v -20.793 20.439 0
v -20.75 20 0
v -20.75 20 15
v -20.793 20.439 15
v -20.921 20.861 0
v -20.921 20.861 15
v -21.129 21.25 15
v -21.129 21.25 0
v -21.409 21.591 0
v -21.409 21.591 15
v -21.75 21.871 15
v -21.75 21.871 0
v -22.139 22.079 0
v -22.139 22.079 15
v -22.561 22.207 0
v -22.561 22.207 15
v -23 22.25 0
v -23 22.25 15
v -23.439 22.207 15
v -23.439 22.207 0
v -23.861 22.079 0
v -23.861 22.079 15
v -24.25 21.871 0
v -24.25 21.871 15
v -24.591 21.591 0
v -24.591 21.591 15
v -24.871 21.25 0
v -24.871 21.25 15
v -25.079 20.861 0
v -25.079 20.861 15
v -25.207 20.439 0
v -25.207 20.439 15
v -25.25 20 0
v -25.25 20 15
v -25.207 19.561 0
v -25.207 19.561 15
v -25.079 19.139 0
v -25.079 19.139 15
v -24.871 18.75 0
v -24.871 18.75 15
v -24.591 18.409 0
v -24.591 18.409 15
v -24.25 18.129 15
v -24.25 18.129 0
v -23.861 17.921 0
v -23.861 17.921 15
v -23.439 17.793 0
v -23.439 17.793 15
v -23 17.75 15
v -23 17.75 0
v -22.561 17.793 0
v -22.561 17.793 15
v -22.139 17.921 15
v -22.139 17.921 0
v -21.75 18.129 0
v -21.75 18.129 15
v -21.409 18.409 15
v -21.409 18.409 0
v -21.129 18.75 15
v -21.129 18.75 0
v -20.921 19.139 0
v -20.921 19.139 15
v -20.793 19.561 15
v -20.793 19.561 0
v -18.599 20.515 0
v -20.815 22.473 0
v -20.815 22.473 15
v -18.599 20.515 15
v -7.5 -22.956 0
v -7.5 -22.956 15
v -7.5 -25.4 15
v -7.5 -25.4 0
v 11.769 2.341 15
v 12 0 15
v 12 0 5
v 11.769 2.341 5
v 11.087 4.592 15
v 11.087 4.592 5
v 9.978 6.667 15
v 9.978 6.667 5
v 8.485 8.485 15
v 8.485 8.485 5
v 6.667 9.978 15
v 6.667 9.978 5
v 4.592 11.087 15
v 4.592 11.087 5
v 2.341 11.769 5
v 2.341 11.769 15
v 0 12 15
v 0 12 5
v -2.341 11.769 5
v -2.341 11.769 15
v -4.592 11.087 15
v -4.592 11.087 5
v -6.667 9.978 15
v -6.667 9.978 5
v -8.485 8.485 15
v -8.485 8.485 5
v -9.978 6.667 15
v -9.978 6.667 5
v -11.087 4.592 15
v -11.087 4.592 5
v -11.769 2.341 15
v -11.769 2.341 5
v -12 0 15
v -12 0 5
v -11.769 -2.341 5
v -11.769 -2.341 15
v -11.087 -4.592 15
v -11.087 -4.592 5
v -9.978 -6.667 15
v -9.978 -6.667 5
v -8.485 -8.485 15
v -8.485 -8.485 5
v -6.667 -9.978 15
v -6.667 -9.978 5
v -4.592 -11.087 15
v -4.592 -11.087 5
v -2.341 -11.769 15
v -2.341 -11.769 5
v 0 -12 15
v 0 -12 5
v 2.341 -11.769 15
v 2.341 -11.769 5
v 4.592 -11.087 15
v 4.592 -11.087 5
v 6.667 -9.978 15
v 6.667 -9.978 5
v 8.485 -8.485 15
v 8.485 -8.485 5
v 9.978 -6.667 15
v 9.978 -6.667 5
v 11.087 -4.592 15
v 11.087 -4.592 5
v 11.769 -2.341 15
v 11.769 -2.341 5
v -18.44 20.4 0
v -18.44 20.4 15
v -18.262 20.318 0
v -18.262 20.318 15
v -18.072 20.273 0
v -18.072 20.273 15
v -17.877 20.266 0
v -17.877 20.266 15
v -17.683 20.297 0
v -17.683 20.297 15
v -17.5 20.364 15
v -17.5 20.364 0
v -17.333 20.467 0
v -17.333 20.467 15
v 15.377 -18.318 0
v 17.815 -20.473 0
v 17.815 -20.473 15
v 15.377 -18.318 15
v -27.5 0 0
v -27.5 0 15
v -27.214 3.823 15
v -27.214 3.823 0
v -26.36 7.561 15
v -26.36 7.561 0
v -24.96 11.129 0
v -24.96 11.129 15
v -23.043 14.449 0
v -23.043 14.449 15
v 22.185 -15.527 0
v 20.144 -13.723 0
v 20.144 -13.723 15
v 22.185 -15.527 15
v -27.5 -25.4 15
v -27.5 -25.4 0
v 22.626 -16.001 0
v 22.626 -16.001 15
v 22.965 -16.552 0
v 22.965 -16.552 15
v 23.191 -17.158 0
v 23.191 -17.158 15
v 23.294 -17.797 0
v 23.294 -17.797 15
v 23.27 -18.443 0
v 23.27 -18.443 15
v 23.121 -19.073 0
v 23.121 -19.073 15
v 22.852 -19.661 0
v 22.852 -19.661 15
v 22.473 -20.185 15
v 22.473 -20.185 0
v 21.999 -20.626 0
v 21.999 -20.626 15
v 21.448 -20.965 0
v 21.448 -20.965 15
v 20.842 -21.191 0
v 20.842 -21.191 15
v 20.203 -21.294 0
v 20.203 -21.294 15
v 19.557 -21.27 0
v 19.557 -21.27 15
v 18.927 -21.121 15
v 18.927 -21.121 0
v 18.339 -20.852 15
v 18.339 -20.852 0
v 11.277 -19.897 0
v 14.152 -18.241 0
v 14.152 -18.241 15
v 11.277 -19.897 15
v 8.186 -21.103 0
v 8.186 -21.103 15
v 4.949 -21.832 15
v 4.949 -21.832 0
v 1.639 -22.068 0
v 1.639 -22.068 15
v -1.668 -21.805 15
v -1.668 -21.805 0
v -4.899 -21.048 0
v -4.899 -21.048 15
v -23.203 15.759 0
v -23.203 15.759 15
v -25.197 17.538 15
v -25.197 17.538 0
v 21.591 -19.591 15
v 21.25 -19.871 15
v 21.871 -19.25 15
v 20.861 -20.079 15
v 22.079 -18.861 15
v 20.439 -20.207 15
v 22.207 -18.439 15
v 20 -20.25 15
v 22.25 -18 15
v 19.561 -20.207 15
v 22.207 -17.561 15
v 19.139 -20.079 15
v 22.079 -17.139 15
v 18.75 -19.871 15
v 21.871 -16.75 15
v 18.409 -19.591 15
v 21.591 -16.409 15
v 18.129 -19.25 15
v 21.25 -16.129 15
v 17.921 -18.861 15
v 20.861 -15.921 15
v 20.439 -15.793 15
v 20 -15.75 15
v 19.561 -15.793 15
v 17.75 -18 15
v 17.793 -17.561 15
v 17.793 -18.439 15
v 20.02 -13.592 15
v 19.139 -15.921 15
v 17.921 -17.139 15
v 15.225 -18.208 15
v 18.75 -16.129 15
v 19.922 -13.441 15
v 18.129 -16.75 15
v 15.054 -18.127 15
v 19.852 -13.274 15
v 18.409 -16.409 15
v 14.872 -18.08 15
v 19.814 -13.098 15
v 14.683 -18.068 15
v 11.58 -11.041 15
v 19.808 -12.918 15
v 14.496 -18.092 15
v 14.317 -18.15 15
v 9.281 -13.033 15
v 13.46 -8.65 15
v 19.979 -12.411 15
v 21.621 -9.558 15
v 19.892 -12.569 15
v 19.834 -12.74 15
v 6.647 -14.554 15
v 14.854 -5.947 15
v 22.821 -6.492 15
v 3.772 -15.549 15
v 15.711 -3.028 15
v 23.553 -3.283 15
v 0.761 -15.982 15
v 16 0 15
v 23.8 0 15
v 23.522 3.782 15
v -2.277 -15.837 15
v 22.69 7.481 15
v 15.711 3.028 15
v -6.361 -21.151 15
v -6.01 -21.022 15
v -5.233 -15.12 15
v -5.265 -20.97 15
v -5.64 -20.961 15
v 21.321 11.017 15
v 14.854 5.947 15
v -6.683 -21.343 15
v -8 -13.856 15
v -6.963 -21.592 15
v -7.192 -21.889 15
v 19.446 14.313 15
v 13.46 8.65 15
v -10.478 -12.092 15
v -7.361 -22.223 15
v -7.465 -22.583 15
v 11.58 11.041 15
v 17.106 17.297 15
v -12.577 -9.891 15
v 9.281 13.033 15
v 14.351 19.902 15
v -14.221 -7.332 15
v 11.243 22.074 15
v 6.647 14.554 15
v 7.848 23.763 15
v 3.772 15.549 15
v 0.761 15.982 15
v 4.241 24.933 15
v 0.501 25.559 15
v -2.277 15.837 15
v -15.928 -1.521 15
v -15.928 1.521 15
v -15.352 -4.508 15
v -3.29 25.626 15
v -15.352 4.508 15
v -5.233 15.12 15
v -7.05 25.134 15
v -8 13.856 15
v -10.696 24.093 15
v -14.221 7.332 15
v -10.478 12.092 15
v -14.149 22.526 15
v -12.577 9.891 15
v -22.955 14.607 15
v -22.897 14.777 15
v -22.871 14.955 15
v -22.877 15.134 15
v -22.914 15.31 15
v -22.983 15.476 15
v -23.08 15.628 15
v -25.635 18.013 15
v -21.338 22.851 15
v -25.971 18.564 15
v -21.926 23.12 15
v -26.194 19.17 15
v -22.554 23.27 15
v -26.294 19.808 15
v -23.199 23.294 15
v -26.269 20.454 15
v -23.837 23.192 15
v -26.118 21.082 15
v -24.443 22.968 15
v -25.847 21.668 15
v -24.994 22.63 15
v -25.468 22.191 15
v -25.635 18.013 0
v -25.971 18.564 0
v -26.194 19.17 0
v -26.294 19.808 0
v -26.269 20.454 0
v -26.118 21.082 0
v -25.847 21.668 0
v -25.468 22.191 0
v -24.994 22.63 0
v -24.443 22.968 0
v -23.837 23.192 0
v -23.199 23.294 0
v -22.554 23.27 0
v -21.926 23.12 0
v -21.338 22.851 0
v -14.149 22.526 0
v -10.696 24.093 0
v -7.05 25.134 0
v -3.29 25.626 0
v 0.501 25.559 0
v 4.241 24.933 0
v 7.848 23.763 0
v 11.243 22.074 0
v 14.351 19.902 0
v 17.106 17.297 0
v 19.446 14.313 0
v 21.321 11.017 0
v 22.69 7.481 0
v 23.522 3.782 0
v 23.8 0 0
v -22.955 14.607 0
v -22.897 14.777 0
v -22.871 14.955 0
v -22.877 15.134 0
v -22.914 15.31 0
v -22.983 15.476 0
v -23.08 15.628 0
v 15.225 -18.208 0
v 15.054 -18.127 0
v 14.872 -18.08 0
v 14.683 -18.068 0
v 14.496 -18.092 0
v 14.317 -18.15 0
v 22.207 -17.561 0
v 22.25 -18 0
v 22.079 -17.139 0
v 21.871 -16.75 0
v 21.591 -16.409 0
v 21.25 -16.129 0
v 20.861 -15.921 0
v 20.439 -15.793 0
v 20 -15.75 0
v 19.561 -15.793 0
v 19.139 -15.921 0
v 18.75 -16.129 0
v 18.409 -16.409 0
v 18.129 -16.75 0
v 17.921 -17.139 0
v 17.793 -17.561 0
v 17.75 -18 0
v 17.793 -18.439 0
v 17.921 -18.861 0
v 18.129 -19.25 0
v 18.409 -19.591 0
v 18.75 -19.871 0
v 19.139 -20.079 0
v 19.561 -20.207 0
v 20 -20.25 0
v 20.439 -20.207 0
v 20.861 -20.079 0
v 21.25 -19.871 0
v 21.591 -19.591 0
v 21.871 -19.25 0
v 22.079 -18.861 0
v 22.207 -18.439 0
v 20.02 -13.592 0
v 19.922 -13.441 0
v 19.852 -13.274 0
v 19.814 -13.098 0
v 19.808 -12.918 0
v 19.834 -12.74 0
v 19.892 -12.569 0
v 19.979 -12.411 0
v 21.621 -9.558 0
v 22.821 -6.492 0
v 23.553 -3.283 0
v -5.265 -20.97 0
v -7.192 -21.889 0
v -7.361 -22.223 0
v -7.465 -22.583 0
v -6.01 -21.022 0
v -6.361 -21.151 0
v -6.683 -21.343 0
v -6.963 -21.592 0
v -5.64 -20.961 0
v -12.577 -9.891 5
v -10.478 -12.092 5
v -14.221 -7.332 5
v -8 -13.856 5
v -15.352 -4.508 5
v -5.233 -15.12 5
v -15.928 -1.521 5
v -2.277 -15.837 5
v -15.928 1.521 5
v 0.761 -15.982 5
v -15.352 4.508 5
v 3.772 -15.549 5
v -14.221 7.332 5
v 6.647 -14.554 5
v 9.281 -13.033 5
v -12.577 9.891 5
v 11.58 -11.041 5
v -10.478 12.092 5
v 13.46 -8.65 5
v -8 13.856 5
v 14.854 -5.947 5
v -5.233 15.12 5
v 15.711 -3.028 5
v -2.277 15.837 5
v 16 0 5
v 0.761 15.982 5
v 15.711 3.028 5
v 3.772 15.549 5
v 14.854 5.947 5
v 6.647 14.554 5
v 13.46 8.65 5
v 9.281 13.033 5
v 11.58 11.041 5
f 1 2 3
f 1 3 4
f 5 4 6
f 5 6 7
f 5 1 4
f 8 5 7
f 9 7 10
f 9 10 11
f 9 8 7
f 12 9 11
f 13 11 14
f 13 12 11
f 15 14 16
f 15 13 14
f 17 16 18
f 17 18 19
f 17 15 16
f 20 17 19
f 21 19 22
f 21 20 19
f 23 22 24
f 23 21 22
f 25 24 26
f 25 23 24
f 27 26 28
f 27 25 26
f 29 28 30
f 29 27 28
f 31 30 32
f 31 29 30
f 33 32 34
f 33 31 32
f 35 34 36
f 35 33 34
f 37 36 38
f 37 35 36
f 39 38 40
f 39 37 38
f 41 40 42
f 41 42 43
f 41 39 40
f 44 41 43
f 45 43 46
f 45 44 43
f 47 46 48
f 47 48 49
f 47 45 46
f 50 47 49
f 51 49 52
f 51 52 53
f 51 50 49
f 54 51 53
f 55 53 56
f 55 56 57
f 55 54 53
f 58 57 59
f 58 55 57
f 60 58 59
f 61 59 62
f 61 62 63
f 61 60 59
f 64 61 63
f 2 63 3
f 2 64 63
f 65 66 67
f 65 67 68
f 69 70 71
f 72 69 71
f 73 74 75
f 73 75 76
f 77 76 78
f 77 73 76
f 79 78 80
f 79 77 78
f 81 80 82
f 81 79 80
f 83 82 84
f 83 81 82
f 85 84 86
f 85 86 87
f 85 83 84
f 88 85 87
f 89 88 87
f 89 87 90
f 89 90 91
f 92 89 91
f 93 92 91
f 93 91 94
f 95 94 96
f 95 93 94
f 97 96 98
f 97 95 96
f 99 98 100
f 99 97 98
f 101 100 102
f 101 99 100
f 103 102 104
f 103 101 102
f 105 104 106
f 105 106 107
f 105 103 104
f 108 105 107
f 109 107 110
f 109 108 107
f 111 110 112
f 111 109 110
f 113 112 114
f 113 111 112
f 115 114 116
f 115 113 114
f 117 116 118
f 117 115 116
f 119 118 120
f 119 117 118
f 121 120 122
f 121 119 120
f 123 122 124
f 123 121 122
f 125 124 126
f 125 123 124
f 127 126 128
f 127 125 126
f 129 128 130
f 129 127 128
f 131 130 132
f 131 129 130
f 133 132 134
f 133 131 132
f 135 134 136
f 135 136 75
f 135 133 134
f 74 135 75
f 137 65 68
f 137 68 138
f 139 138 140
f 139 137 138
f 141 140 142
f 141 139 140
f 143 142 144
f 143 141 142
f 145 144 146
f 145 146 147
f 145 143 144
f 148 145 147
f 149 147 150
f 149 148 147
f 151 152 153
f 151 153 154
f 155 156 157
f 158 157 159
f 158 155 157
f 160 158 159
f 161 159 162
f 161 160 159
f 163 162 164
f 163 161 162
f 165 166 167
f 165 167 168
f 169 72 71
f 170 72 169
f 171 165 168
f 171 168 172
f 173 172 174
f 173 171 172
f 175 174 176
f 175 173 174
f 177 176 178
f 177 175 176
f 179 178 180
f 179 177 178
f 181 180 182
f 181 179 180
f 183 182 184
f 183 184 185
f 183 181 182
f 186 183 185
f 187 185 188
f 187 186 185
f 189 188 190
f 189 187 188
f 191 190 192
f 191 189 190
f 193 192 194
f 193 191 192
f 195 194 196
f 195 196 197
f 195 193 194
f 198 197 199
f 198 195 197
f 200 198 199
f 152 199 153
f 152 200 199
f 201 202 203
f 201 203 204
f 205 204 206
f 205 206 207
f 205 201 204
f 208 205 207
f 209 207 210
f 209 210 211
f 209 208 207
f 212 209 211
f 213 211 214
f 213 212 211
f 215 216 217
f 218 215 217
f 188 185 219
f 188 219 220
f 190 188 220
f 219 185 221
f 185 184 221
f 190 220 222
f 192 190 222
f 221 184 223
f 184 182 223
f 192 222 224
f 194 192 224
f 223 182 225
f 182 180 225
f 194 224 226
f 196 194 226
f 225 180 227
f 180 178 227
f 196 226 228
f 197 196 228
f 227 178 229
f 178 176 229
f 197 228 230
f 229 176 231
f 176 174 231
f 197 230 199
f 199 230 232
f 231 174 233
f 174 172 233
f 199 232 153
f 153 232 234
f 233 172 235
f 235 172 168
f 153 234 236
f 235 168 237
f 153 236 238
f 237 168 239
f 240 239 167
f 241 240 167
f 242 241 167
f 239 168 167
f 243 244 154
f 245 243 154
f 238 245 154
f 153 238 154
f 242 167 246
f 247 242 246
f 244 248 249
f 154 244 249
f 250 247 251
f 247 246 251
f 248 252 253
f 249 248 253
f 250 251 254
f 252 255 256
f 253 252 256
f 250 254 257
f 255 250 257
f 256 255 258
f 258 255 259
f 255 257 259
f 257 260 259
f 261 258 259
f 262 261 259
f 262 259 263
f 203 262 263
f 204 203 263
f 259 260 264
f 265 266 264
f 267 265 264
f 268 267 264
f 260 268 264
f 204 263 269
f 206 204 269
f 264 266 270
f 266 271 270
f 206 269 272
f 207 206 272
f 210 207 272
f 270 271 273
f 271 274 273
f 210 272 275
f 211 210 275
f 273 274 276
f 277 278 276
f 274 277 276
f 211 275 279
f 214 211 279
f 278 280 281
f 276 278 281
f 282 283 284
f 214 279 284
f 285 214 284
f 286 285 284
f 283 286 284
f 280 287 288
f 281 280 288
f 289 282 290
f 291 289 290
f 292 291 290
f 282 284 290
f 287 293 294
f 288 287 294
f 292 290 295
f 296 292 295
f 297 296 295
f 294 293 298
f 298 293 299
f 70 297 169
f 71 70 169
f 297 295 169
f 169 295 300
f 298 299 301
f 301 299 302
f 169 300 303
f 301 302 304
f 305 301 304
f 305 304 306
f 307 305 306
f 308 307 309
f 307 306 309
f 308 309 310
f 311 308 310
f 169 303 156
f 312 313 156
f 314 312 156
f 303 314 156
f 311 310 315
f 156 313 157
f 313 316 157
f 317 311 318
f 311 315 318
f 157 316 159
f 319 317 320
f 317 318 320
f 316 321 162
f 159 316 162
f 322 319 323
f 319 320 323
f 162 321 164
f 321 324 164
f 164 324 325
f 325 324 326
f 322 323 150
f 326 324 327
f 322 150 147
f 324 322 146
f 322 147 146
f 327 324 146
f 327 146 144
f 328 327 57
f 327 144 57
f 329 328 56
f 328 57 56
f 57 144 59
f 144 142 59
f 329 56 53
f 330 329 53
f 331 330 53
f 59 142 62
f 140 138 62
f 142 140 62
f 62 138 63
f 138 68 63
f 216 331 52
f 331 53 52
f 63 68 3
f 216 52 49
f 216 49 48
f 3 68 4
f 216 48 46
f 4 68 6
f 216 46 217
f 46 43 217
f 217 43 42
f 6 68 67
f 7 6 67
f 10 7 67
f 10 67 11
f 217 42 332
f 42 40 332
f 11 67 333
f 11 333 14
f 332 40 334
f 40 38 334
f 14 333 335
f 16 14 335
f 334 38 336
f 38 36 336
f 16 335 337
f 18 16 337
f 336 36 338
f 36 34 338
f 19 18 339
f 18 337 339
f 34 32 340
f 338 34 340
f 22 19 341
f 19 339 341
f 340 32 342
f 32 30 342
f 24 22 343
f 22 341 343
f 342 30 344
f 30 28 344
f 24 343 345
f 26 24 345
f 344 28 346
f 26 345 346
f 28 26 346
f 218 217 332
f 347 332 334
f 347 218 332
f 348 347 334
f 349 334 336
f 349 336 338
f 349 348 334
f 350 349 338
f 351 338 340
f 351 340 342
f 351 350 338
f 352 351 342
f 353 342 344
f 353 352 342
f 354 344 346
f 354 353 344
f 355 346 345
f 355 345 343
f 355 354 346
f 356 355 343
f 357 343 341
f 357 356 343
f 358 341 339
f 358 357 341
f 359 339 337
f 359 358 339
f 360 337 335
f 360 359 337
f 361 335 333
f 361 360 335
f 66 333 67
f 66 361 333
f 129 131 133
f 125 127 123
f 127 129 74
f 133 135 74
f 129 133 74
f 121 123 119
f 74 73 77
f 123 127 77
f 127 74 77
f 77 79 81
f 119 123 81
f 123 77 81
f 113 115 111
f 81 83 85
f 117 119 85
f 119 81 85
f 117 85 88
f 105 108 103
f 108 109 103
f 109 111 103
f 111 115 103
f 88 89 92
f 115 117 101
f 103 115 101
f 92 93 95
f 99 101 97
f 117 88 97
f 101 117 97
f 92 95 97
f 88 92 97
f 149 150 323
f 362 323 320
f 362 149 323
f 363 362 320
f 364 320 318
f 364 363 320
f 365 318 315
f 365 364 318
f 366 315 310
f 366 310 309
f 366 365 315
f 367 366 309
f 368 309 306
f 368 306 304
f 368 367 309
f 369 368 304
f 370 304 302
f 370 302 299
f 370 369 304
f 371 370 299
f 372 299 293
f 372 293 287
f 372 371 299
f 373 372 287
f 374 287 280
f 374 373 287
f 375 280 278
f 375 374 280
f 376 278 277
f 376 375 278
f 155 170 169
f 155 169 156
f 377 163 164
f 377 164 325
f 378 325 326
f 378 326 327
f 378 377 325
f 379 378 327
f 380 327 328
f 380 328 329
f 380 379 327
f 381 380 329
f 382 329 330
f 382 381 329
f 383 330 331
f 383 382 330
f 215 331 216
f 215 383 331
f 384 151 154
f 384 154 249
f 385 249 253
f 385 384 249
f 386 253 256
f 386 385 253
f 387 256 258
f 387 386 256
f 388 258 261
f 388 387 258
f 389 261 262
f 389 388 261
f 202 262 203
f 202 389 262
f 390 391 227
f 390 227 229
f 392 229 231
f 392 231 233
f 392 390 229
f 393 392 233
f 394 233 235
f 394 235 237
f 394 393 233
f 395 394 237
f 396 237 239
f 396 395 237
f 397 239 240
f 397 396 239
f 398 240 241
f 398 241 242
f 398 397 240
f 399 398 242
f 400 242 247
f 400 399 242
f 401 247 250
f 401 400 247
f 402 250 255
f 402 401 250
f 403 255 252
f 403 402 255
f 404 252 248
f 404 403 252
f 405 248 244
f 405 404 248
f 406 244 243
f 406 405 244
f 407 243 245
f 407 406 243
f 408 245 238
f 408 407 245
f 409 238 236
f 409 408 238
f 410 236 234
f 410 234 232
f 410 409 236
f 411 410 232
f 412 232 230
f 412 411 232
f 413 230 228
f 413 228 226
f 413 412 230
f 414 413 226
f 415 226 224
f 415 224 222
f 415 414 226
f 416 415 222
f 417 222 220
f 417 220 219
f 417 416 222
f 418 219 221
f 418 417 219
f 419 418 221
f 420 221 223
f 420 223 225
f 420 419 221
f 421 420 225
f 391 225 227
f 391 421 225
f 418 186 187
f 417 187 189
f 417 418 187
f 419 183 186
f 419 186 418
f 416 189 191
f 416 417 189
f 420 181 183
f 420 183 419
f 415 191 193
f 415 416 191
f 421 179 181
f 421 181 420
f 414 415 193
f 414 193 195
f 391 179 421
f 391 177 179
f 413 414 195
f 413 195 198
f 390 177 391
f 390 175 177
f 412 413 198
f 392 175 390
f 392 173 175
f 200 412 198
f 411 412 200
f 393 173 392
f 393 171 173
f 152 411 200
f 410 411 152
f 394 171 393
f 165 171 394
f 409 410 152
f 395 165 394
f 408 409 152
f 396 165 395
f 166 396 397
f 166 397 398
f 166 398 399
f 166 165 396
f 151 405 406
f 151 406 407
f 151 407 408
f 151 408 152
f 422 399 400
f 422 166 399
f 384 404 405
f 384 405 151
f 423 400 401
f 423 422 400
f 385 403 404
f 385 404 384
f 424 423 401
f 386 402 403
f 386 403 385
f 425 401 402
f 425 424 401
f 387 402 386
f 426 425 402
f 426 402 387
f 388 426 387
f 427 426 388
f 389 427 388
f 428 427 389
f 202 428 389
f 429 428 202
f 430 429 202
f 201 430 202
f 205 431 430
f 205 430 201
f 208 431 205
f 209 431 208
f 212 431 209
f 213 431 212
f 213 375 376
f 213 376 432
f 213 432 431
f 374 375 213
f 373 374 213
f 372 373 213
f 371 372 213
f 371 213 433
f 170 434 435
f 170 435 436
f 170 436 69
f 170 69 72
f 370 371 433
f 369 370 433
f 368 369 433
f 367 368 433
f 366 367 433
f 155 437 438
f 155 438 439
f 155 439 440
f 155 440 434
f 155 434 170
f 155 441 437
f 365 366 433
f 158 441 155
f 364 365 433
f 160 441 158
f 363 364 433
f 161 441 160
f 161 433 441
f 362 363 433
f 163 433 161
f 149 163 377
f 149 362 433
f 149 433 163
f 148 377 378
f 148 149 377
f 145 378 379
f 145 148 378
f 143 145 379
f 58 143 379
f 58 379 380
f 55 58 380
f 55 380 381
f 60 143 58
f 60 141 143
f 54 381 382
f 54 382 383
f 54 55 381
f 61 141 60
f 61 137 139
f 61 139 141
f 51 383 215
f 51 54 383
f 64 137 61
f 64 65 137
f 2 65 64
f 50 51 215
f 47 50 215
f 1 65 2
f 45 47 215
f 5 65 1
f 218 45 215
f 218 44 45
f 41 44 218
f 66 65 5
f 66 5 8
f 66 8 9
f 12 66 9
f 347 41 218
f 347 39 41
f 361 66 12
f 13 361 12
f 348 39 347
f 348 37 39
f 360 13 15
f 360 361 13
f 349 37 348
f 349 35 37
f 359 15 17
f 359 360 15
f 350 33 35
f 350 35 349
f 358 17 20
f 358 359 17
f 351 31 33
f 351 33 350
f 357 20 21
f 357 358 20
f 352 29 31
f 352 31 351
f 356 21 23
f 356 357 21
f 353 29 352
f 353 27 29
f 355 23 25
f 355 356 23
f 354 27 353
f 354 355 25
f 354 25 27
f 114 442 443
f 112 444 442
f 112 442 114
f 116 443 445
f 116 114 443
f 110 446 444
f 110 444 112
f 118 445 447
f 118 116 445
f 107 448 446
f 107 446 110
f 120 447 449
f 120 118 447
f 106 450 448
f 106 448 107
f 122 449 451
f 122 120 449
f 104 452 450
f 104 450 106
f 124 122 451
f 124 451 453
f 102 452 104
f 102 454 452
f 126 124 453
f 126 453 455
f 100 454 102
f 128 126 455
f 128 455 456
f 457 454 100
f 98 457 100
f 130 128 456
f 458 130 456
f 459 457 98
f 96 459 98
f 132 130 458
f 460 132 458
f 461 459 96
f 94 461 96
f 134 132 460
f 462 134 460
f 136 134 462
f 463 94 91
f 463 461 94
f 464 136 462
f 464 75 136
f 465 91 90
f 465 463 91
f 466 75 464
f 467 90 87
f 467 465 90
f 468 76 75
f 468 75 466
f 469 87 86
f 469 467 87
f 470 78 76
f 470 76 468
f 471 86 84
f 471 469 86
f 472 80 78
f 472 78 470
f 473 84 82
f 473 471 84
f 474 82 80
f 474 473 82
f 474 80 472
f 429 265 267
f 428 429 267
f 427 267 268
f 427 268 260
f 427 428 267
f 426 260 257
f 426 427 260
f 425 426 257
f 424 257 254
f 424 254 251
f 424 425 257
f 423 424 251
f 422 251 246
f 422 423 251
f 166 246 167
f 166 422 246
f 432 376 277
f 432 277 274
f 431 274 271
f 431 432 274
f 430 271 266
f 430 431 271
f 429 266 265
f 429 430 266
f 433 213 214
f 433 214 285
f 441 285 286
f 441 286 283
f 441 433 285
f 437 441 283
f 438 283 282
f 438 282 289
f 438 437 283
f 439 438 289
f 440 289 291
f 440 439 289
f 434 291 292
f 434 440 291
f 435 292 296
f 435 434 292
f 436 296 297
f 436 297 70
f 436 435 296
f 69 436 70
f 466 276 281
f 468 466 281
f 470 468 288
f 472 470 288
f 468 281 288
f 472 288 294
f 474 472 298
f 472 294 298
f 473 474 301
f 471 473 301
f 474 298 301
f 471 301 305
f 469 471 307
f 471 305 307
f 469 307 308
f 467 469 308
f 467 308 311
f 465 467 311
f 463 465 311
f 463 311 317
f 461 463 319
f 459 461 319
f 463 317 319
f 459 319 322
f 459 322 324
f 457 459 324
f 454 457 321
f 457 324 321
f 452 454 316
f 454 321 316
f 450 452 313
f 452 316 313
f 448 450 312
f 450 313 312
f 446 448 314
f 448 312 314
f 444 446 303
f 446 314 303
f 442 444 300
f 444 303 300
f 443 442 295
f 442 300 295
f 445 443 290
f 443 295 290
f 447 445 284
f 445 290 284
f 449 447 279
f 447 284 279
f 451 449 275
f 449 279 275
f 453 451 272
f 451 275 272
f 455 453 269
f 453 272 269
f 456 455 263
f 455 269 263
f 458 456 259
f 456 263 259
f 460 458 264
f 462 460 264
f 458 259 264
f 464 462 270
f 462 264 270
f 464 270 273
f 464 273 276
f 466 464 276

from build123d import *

# Parameters (mm, degrees)
SZKIC1_R                    = 2.25
DODANIE_WYCI_GNI_CIE1_DEPTH = 15
SZKIC2_R                    = 16
SZKIC2_R_2                  = 12
WYTNIJ_WYCI_GNI_CIE1_DEPTH  = 10


with BuildPart() as part:
    # Szkic1 → Dodanie-wyciągnięcie1 (new body)
    with BuildSketch(Plane.XY):
        with BuildLine():
            Line((-7.5, -25.4), (-27.5000055, -25.4))
            Line((-27.5000055, -25.4), (-27.5000055, 0))
            ThreePointArc((-27.5000055, 0), (-26.360400157, 7.560626052), (-23.04284729, 14.449429258))
            ThreePointArc((-23.04284729, 14.449429258), (-22.876506159, 15.134411684), (-23.203344978, 15.75894886))
            Line((-23.203344978, 15.75894886), (-25.196922194, 17.537575813))
            ThreePointArc((-25.196922194, 17.537575813), (-25.467611983, 22.191093586), (-20.814747272, 22.472785982))
            Line((-20.814747272, 22.472785982), (-18.598905377, 20.514600122))
            ThreePointArc((-18.598905377, 20.514600122), (-17.974550182, 20.264645495), (-17.333078903, 20.466663618))
            ThreePointArc((-17.333078903, 20.466663618), (9.576401492, 22.98111988), (23.8, 0))
            ThreePointArc((23.8, 0), (22.82107067, -6.492449946), (19.979075206, -12.411340949))
            ThreePointArc((19.979075206, -12.411340949), (19.813964518, -13.098271951), (20.143734708, -13.723081814))
            Line((20.143734708, -13.723081814), (22.185252728, -15.527214018))
            ThreePointArc((22.185252728, -15.527214018), (22.472785982, -20.185252728), (17.814747272, -20.472785982))
            Line((17.814747272, -20.472785982), (15.376980036, -18.318480053))
            ThreePointArc((15.376980036, -18.318480053), (14.777726241, -18.069792078), (14.151976117, -18.241220202))
            ThreePointArc((14.151976117, -18.241220202), (4.948796089, -21.832347138), (-4.899043329, -21.048271831))
            ThreePointArc((-4.899043329, -21.048271831), (-6.68281162, -21.343100938), (-7.5, -22.955849111))
            Line((-7.5, -22.955849111), (-7.5, -25.4))
        make_face()
        with Locations((-23, 20)):
            Circle(SZKIC1_R, mode=Mode.SUBTRACT)
        with Locations((20, -18)):
            Circle(SZKIC1_R, mode=Mode.SUBTRACT)
    extrude(amount=DODANIE_WYCI_GNI_CIE1_DEPTH)

    # Szkic2 → Wytnij-wyciągnięcie1 (cut)
    with BuildSketch(Plane.XY.offset(15)):
        Circle(SZKIC2_R)
        Circle(SZKIC2_R_2, mode=Mode.SUBTRACT)
    extrude(amount=-WYTNIJ_WYCI_GNI_CIE1_DEPTH, mode=Mode.SUBTRACT)


solid = part.part
